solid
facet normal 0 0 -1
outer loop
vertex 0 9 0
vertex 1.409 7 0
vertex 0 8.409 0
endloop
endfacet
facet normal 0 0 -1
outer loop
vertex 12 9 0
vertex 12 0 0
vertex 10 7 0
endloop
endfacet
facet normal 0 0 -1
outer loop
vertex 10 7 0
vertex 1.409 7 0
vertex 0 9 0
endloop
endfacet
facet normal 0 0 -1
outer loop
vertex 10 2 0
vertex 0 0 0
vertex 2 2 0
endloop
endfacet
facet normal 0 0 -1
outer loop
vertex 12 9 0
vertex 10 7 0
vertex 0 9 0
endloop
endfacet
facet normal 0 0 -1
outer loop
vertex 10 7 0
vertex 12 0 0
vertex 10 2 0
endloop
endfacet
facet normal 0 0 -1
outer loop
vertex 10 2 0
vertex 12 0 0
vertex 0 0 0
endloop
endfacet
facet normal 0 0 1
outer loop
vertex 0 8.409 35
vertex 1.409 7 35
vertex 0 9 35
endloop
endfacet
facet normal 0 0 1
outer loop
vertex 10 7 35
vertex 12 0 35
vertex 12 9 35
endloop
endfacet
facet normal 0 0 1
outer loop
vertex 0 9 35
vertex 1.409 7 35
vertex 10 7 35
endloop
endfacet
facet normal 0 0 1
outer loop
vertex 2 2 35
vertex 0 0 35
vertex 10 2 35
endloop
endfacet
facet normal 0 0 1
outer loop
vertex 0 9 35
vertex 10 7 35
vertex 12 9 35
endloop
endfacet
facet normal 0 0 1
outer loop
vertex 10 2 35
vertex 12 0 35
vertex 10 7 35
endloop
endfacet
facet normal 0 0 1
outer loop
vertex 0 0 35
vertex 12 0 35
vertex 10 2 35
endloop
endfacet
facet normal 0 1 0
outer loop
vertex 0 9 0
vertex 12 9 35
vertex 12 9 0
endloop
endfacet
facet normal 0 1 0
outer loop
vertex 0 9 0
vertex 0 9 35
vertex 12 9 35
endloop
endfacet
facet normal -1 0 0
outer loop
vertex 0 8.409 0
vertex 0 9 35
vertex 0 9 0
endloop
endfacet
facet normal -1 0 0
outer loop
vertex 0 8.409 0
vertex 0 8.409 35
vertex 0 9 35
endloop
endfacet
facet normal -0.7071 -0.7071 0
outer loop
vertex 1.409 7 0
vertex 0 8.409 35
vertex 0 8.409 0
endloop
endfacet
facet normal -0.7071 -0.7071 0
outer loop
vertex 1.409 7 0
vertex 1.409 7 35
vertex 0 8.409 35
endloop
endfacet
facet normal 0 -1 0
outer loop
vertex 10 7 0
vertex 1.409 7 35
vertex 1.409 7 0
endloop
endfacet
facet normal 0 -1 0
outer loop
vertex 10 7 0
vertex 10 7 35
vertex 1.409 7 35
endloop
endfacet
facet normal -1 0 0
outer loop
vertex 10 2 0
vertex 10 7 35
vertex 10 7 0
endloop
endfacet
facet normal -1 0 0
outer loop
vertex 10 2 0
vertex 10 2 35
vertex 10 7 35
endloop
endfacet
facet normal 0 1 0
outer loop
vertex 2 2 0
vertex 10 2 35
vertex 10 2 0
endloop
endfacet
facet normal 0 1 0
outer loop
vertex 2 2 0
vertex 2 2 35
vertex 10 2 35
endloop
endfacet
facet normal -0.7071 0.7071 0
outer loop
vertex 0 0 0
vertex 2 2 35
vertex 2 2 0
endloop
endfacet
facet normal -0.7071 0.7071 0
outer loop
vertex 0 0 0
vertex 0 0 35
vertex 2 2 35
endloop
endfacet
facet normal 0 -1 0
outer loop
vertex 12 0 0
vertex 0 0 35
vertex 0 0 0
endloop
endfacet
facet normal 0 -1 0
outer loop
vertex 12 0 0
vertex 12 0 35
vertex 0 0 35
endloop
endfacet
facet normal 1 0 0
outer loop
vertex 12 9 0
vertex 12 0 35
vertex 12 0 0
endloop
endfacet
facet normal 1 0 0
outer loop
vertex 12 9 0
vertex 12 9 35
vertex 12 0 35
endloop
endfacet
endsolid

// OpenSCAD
bredde=35;
dybde=5;
hoyde=10;
veggtykkelse=2;
slakk=1;

linear_extrude(bredde)
    difference() {
        square([hoyde+veggtykkelse,veggtykkelse*2+dybde]);
        translate([0, veggtykkelse]) square([hoyde,dybde]);
    rotate([0, 0, 45])
        square([dybde*sqrt(sqrt(2)),dybde*sqrt(sqrt(2))]);
    }
